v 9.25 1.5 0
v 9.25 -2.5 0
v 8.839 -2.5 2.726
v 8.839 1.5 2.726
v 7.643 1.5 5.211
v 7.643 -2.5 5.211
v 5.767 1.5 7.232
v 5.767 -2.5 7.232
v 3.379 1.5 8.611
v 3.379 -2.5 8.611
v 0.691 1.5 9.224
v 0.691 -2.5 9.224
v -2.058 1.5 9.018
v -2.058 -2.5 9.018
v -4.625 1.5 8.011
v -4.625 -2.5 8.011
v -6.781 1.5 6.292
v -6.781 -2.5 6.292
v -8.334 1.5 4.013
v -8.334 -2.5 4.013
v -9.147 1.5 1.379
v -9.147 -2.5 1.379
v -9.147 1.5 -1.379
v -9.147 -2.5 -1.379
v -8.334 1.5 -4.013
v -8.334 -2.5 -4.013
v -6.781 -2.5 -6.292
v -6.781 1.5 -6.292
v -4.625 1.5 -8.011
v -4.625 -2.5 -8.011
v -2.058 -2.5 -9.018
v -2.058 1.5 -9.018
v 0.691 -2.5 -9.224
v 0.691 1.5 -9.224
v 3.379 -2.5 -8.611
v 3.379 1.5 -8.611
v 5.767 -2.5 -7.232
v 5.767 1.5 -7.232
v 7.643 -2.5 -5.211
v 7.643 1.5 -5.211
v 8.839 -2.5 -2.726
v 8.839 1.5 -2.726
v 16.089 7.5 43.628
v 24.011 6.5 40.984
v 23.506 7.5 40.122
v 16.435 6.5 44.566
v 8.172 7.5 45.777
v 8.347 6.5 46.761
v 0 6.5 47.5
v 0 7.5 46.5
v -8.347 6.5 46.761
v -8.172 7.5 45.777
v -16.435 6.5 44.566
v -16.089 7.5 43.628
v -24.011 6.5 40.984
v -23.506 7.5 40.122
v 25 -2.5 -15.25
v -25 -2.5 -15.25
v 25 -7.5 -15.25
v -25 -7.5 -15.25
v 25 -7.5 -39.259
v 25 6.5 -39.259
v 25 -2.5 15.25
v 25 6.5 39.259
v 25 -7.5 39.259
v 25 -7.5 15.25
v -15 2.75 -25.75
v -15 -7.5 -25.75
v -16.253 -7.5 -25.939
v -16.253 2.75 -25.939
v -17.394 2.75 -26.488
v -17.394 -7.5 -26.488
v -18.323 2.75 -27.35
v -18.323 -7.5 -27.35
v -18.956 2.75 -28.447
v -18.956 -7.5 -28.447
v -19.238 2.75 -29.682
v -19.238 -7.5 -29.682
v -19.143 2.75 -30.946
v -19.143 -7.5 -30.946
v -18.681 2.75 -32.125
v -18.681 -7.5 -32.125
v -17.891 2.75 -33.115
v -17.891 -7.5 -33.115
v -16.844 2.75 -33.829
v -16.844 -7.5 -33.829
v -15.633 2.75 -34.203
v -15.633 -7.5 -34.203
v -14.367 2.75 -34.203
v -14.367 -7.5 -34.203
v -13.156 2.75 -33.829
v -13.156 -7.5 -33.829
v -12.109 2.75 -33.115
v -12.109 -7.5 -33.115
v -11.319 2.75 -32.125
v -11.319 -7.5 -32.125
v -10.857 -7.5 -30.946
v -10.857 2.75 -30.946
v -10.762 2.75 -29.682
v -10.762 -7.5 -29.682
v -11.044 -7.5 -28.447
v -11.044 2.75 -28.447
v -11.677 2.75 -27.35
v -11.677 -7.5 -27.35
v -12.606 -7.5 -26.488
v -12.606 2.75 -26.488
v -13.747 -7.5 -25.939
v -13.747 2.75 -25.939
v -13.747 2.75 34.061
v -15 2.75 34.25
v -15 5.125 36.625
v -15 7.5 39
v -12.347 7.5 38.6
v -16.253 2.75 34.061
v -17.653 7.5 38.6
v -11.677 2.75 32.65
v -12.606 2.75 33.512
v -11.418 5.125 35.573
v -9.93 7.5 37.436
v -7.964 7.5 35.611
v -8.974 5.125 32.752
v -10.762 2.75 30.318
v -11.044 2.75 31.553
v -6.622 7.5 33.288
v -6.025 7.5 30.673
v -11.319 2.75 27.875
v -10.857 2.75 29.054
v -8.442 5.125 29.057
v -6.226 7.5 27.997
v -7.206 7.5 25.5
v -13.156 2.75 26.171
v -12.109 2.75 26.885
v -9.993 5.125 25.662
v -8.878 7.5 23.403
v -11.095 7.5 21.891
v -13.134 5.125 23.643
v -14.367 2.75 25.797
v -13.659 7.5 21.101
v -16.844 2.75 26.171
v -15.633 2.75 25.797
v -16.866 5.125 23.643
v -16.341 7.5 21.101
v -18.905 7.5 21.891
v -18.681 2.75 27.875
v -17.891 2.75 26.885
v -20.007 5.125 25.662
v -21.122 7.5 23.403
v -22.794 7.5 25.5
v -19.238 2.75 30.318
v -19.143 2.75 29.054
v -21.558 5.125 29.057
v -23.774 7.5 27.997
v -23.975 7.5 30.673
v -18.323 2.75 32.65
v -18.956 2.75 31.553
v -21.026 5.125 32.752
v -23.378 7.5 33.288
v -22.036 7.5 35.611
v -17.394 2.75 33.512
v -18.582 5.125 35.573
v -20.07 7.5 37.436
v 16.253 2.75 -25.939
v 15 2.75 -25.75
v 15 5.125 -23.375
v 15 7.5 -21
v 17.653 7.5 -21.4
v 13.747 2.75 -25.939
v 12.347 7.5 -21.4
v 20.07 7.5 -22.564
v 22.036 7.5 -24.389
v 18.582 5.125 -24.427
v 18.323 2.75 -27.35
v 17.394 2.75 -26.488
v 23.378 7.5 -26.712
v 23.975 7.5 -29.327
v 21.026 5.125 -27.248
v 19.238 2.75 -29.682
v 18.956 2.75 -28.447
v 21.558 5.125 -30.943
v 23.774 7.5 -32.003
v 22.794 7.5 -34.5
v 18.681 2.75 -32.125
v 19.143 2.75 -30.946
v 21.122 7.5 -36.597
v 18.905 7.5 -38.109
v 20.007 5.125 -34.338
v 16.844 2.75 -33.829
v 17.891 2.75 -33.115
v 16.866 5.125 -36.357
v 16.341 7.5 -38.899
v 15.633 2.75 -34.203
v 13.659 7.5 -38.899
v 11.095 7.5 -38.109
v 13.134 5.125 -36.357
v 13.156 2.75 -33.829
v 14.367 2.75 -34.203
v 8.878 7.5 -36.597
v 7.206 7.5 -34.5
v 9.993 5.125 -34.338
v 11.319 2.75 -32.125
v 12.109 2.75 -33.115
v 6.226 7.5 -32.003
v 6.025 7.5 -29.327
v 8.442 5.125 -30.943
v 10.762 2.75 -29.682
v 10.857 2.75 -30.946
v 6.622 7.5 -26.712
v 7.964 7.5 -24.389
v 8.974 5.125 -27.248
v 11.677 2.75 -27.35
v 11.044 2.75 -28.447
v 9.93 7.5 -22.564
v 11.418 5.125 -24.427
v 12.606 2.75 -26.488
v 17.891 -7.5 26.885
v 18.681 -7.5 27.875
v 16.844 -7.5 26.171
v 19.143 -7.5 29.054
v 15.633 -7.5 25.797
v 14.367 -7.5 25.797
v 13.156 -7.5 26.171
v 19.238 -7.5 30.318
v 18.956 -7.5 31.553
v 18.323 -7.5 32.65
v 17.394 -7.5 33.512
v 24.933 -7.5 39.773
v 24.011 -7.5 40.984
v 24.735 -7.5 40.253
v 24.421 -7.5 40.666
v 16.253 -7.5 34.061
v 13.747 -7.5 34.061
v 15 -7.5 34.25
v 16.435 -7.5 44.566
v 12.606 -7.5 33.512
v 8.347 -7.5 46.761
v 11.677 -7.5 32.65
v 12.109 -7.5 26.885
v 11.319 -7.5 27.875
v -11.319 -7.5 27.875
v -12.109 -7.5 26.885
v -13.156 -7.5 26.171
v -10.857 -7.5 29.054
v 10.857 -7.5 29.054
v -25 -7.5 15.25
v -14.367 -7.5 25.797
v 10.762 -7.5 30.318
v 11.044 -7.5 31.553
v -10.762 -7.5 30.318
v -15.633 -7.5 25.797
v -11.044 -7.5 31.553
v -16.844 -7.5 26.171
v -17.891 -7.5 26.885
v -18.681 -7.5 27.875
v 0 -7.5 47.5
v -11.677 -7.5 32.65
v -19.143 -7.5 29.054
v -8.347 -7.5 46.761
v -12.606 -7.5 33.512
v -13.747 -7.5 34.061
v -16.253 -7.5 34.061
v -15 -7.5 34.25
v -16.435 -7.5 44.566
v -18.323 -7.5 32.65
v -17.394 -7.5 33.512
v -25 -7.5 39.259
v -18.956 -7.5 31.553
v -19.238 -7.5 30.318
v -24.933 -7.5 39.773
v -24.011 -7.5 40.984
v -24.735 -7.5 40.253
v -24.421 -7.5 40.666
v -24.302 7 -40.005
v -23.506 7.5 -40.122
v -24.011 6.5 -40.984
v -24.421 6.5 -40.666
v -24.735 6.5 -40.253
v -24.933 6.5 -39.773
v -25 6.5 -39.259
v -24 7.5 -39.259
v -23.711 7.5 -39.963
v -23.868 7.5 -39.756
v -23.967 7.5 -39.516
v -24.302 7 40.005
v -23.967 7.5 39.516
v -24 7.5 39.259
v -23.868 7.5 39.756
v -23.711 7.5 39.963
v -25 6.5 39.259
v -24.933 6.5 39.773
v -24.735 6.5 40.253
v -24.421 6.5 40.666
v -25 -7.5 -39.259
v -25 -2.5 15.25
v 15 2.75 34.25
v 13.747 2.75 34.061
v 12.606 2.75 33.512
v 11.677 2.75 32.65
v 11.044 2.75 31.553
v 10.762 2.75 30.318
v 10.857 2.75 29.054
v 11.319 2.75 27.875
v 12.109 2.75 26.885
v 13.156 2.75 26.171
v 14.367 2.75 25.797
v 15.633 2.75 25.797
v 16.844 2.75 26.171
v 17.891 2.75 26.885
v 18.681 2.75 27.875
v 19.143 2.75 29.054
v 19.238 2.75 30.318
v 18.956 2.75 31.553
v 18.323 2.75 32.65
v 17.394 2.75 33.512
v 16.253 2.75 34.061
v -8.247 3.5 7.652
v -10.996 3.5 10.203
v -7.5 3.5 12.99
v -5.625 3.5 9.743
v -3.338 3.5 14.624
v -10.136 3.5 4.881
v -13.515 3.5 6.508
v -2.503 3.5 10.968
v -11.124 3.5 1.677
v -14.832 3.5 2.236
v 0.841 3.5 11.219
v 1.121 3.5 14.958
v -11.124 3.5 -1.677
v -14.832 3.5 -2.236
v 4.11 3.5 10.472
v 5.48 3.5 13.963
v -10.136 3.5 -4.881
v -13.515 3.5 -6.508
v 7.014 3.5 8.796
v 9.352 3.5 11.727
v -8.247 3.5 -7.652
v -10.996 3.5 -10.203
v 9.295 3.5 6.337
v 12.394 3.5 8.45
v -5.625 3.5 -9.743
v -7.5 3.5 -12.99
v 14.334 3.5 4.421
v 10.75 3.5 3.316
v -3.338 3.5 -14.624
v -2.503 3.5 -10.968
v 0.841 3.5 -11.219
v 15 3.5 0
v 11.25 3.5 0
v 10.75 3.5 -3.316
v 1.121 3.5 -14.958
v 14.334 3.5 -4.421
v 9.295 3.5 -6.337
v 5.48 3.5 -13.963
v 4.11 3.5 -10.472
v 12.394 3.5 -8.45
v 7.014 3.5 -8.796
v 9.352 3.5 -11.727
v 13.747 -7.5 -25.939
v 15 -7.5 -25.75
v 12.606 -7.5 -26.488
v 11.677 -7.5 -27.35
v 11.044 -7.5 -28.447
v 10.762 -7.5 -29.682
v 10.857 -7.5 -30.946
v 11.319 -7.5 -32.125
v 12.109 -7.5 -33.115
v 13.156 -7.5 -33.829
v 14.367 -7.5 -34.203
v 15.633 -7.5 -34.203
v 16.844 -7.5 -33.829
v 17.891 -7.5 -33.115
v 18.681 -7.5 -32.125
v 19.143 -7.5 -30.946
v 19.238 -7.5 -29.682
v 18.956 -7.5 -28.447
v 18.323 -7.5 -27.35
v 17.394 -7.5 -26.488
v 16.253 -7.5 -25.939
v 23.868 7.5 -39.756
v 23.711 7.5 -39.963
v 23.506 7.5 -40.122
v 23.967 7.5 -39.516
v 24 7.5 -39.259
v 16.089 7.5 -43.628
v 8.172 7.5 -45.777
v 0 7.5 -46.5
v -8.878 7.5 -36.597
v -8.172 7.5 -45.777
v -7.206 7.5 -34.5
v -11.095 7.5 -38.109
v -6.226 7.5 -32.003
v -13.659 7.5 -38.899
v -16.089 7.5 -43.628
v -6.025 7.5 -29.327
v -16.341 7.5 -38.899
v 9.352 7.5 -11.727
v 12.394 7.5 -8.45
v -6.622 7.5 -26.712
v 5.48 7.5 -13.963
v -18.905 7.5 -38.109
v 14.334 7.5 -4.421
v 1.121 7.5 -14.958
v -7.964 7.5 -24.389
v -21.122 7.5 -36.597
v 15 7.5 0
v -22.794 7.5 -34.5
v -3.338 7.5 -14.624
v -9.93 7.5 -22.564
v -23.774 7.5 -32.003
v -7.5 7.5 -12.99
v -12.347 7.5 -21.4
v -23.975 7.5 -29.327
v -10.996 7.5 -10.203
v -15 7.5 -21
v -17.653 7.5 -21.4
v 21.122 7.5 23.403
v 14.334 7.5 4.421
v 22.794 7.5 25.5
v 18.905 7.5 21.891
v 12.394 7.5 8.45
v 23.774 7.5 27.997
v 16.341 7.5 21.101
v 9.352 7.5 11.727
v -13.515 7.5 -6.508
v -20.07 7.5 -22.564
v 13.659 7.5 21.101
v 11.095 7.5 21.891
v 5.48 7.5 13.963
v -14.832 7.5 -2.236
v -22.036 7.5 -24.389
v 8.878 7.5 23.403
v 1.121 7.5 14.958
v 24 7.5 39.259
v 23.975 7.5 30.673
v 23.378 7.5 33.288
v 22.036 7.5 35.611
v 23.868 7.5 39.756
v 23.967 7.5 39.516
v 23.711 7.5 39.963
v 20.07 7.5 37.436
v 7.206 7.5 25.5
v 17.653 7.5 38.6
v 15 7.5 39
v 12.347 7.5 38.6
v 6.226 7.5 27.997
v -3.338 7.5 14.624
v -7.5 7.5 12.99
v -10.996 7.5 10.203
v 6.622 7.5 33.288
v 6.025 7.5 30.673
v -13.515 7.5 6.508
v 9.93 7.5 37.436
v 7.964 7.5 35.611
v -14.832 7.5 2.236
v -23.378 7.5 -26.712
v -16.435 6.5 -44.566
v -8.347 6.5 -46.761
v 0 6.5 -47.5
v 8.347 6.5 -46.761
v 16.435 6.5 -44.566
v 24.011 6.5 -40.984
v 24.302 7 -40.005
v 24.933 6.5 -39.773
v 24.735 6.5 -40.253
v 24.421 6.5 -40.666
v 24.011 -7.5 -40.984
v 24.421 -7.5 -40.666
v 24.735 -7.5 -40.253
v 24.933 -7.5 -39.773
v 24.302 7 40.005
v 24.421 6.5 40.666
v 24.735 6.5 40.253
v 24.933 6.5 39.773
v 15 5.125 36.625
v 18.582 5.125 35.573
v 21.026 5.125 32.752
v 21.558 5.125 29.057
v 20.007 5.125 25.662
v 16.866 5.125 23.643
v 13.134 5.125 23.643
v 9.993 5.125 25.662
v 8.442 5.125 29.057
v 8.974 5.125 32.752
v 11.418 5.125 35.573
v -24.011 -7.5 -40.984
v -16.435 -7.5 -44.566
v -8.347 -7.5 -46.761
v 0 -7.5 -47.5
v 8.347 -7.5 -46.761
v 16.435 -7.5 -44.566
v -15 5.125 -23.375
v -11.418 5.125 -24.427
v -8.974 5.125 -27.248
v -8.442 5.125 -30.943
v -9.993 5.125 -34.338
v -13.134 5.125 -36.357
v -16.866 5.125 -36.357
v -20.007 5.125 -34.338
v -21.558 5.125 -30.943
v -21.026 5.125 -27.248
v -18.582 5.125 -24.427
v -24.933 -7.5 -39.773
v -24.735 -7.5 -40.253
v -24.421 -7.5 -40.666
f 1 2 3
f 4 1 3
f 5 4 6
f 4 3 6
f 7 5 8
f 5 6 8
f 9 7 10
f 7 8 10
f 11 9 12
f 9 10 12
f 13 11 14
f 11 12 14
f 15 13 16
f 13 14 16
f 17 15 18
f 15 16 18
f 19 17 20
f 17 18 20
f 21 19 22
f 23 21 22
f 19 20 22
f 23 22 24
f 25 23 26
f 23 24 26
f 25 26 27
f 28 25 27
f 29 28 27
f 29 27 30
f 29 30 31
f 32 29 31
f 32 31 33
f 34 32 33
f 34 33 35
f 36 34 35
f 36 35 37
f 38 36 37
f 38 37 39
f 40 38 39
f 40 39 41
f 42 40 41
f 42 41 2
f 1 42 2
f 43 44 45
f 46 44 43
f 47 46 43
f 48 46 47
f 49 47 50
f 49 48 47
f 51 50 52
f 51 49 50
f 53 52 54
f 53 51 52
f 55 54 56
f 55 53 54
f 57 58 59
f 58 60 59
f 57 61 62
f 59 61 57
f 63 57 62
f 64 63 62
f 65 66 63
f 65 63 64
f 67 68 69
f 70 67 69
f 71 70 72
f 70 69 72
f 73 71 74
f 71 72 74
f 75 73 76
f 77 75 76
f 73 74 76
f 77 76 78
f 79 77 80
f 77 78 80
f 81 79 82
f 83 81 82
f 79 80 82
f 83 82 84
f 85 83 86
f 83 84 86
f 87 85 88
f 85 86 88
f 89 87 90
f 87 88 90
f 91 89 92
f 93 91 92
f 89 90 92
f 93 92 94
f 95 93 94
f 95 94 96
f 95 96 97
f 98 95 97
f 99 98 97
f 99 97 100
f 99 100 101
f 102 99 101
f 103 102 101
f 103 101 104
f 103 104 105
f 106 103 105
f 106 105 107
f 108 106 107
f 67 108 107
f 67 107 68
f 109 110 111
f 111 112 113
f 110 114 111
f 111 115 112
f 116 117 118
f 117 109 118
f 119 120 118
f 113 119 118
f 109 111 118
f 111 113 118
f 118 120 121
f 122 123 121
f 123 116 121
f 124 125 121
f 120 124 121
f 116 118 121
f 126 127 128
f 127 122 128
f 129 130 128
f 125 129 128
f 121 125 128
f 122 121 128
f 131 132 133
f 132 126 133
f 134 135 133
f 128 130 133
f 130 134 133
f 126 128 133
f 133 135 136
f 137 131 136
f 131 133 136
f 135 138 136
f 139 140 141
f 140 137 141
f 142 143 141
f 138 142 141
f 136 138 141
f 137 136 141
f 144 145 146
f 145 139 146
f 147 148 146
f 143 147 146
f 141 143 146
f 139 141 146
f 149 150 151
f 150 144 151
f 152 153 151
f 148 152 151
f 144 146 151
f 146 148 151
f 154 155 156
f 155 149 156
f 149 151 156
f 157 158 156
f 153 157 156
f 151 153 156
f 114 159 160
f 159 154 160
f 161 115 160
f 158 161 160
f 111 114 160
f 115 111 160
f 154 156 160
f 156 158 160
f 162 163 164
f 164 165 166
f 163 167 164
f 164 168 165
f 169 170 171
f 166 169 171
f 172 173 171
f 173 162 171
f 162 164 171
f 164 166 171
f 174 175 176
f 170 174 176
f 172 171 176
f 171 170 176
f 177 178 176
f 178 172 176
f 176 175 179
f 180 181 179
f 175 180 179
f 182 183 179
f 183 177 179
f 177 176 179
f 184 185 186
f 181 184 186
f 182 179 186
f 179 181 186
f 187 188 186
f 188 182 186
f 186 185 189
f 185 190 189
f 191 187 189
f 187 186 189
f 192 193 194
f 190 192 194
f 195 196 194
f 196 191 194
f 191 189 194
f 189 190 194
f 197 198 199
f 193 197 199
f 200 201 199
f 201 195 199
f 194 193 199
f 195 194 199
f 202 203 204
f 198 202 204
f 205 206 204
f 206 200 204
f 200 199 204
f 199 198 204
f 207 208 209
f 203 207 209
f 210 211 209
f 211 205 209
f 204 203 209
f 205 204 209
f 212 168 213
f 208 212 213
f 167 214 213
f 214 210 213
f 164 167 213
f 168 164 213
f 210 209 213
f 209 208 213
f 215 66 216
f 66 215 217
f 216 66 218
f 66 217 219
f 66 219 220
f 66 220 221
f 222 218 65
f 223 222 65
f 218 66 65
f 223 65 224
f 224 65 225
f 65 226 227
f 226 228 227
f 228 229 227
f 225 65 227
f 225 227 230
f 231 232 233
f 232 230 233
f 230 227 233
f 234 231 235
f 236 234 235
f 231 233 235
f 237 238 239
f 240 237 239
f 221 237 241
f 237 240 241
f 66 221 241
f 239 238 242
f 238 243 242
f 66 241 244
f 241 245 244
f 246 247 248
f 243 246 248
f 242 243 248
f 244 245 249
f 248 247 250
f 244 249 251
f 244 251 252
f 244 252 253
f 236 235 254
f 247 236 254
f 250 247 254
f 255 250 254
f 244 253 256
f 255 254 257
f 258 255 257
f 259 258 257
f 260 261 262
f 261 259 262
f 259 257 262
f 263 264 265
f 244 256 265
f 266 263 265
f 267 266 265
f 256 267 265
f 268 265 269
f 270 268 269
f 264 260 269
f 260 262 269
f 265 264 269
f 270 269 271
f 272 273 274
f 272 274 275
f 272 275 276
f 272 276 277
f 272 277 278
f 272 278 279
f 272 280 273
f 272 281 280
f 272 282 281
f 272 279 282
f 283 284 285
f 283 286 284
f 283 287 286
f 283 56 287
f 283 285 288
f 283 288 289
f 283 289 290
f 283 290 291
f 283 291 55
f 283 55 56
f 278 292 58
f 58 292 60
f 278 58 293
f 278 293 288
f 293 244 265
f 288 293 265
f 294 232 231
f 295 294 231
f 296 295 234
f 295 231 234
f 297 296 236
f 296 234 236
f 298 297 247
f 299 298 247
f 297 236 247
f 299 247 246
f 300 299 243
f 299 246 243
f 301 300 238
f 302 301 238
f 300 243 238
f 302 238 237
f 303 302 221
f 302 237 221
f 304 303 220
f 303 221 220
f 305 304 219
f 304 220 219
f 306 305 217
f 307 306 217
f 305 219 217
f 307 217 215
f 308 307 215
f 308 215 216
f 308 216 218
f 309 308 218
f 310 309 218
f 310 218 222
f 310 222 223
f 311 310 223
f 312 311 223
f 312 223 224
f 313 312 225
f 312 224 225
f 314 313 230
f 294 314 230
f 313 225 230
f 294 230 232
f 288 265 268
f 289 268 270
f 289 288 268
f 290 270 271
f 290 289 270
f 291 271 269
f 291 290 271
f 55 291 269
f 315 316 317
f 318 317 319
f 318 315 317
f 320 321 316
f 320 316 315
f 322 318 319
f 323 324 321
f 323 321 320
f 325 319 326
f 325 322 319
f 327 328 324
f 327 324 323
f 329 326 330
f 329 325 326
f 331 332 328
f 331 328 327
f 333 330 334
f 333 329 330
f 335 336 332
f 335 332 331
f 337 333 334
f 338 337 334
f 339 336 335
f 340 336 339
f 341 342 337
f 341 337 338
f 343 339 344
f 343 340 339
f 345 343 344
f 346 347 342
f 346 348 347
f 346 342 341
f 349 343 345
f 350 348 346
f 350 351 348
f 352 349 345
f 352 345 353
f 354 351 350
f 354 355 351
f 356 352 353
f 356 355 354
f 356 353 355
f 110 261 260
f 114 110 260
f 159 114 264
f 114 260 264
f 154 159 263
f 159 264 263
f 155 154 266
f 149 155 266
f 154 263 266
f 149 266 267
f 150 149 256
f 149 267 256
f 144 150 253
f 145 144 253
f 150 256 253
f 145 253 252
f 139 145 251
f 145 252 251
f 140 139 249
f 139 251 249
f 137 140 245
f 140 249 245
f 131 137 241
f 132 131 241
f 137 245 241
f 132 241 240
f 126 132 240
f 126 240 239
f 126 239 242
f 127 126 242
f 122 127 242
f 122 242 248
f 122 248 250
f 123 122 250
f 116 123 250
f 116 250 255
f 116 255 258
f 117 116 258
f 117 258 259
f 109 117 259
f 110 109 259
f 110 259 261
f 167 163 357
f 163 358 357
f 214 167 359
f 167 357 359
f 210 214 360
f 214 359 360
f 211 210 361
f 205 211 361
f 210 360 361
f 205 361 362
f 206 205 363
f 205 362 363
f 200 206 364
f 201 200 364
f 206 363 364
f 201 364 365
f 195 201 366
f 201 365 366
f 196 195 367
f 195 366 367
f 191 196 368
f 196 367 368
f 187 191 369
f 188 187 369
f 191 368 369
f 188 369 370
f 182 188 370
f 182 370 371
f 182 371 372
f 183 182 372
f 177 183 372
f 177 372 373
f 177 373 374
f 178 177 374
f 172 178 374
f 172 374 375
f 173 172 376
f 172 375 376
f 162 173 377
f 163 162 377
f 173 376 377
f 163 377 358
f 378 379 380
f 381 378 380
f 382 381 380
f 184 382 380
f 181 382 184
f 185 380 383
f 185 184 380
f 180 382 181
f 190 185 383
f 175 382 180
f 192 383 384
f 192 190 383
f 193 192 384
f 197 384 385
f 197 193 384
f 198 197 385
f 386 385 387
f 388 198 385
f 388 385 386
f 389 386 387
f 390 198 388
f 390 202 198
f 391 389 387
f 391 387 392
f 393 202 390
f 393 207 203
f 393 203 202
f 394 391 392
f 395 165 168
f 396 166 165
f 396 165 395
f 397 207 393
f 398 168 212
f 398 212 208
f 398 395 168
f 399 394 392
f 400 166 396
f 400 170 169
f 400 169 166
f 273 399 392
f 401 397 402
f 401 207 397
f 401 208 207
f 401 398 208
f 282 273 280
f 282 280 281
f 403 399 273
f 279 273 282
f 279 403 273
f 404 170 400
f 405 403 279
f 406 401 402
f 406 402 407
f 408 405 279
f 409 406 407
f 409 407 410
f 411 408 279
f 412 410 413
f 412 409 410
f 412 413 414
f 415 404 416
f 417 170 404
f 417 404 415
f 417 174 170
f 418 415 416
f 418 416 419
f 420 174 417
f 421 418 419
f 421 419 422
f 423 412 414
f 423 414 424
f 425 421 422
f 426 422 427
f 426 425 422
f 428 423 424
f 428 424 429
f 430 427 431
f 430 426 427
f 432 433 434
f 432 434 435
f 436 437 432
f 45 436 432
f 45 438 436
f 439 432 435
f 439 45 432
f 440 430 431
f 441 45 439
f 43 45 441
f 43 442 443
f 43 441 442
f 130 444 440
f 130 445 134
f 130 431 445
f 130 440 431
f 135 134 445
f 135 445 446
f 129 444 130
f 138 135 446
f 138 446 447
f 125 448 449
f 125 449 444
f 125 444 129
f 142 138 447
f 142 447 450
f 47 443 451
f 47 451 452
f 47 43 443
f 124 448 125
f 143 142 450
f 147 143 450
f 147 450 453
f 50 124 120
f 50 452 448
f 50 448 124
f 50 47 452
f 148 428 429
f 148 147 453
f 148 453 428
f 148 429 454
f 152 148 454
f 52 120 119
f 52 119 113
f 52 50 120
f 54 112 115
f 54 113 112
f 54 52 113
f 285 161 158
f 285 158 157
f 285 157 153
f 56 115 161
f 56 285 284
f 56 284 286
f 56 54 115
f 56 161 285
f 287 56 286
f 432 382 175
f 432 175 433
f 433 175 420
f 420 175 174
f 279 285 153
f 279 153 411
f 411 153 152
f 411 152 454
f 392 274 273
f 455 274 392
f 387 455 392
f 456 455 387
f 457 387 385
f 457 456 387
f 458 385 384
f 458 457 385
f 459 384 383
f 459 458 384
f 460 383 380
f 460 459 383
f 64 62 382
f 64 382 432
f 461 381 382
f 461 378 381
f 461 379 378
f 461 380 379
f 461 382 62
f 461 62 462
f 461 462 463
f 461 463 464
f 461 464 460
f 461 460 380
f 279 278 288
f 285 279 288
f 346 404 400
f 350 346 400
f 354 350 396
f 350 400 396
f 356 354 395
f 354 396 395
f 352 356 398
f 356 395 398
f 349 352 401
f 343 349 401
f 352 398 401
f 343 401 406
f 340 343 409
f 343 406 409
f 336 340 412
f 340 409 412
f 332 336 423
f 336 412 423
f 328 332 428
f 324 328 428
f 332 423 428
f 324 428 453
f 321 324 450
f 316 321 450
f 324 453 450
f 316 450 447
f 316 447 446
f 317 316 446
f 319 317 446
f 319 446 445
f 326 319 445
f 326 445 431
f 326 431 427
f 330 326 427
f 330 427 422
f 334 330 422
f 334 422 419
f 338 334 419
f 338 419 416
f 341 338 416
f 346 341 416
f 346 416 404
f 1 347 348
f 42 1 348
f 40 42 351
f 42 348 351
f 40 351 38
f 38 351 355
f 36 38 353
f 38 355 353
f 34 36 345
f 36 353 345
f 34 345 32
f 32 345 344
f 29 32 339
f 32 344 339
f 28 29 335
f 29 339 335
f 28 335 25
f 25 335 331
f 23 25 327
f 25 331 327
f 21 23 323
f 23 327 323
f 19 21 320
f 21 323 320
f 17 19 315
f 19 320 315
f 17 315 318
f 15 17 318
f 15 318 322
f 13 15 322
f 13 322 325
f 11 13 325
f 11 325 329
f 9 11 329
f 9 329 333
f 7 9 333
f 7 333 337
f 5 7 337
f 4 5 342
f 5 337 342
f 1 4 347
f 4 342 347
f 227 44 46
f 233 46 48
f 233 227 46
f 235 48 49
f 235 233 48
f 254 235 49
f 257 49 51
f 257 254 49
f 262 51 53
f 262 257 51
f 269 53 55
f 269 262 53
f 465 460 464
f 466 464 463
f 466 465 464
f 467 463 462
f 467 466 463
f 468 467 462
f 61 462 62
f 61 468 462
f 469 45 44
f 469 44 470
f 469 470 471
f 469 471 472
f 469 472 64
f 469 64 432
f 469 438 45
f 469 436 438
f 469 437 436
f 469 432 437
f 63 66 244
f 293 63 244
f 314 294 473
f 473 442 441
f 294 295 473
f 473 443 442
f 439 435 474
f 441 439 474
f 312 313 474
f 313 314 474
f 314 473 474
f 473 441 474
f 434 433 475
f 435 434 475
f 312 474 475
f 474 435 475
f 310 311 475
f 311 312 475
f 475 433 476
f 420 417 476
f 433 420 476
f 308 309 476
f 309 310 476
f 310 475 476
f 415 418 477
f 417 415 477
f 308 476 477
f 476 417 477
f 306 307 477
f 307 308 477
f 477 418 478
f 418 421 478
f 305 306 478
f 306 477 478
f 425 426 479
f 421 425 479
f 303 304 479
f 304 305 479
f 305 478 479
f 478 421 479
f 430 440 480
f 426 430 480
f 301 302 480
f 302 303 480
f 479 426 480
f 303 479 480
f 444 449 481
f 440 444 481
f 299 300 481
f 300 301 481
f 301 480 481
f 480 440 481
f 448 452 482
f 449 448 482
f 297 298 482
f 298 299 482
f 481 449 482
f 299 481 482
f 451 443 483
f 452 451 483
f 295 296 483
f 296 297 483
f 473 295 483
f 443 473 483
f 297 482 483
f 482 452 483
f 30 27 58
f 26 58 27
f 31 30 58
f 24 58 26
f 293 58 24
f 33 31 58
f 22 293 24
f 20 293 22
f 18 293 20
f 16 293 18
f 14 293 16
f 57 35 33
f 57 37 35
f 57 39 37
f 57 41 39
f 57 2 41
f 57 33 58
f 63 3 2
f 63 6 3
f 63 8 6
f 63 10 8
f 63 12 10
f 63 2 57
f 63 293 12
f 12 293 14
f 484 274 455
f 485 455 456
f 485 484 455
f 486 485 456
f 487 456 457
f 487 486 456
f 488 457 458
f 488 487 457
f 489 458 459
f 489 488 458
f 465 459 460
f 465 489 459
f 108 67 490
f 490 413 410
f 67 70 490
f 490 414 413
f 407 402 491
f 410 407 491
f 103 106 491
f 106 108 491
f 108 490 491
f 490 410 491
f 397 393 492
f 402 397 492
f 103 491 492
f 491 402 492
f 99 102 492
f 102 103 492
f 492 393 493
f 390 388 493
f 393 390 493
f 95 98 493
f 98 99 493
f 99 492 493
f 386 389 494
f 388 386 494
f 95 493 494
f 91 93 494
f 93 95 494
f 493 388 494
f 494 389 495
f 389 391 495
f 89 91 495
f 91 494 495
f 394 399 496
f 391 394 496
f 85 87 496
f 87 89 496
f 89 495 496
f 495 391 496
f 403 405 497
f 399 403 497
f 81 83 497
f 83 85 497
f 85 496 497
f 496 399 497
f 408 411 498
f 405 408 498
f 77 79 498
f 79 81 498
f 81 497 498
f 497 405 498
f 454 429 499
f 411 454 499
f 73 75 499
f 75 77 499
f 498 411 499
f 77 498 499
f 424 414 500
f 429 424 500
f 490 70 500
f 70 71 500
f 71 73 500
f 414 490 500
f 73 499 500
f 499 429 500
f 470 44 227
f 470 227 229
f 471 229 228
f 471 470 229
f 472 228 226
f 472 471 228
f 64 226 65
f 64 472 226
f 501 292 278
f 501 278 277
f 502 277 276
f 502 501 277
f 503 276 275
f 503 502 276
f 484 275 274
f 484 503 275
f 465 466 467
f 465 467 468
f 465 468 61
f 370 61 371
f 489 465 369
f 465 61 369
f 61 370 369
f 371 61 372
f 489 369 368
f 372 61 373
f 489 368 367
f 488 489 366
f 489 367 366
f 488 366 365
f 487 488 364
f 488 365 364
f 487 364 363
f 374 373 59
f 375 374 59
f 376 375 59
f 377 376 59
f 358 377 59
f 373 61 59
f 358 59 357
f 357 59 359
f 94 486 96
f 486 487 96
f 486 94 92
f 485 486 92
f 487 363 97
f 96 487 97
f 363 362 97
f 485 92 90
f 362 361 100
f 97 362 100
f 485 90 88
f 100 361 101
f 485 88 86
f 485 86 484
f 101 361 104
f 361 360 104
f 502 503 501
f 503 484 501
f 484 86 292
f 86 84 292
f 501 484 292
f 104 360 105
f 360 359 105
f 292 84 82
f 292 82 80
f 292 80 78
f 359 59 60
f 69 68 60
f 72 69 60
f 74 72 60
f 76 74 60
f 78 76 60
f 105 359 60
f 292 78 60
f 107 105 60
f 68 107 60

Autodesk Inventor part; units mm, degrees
ref_plane "YZ Plane" through (0, 0, 0) normal (1, 0, 0) x (0, 1, 0)
ref_plane "XZ Plane" through (0, 0, 0) normal (0, 1, 0) x (-1, 0, 0)
ref_plane "XY Plane" through (0, 0, 0) normal (0, 0, 1) x (1, 0, 0)
sketch "Sketch2" plane through (0, 0, 0) normal (0, 1, 0) x (-1, 0, 0)
  circle A0 centre (0, 0) radius 47.5
  line L0 (25, -40.3887) -> (25, 40.3887)
  line L1 (66.5, 0) -> (-66.5, 0) construction
  line L2 (0, -66.5) -> (0, 66.5) construction
  line L3 (-25, -40.3887) -> (-25, 40.3887)
  dimension "d3" = 95
  dimension "d4" = 50
extrude "Extrusion2" add sketch "Sketch2" along normal mid plane 15 contours L0 A0 L3
sketch "Sketch3" plane through (0, -7.5, 0) normal (0, -1, 0) x (1, 0, 0)
  arc A0 (-25, -40.3887) -> (25, -40.3887) centre (0, 0) ccw projected
  line L0 (25, -40.3887) -> (25, 40.3887) projected
  arc A1 (25, 40.3887) -> (-25, 40.3887) centre (0, 0) ccw projected
  line L1 (-25, 40.3887) -> (-25, -40.3887) projected
  line L2 (-25, -15.25) -> (25, -15.25)
  line L3 (25, -15.25) -> (25, 15.25)
  line L4 (25, 15.25) -> (-25, 15.25)
  line L5 (-25, 15.25) -> (-25, -15.25)
  line L6 (-25, -15.25) -> (25, 15.25) construction
  line L7 (25, -15.25) -> (-25, 15.25) construction
  circle A2 centre (0, 0) radius 9.25
  dimension "d7" = 30.5
  dimension "d10" = 18.5
extrude "Extrusion3" cut sketch "Sketch3" against normal blind 5 contours L1 L4 L0 L2 | A2
extrude "Extrusion4" cut sketch "Sketch3" against normal through all contours A2
sketch "Sketch4" plane through (0, 7.5, 0) normal (0, 1, 0) x (1, 0, 0)
  circle A0 centre (0, 0) radius 15
  dimension "d13" = 30
extrude "Extrusion5" cut sketch "Sketch4" against normal blind 4
chamfer "Chamfer1" distance 2 angle 45 1 edges at (-9.25, 3.5, 0)
sketch "Sketch5" plane through (0, 7.5, 0) normal (0, 1, 0) x (1, 0, 0)
  line L0 (15, -30) -> (-15, -30) construction
  line L1 (-15, -30) -> (-15, 30) construction
  line L2 (-15, 30) -> (15, 30) construction
  line L3 (15, 30) -> (15, -30) construction
  line L4 (15, -30) -> (-15, 30) construction
  line L5 (-15, -30) -> (15, 30) construction
  point P0 (0, 0)
  dimension "d19" = 30
  dimension "d20" = 60
hole "Hole1" at (-15, 7.5, -30) at (15, 7.5, -30) at (-15, 7.5, 30) at (15, 7.5, 30) direction (0, -1, 0) diameter 8.5 end through all countersink diameter 18 countersink angle 90 clearance for "Countersunk Flat Head Screw ISO 2009/7046" size "M8" standard "ISO"
fillet "Fillet1" radius 2 4 edges at (25, 0, 40.3887) (-25, 0, 40.3887) (-25, 0, -40.3887) (25, 0, -40.3887)
chamfer "Chamfer2" distance 1 angle 45 8 edges at (0, 7.5, 47.5) (24.7352, 7.5, 40.2532) (25, 7.5, 0) (24.7352, 7.5, -40.2532) (0, 7.5, -47.5) (-24.7352, 7.5, -40.2532) (-25, 7.5, 0) (-24.7352, 7.5, 40.2532)
properties part number "HM1_FIXT2-002"
